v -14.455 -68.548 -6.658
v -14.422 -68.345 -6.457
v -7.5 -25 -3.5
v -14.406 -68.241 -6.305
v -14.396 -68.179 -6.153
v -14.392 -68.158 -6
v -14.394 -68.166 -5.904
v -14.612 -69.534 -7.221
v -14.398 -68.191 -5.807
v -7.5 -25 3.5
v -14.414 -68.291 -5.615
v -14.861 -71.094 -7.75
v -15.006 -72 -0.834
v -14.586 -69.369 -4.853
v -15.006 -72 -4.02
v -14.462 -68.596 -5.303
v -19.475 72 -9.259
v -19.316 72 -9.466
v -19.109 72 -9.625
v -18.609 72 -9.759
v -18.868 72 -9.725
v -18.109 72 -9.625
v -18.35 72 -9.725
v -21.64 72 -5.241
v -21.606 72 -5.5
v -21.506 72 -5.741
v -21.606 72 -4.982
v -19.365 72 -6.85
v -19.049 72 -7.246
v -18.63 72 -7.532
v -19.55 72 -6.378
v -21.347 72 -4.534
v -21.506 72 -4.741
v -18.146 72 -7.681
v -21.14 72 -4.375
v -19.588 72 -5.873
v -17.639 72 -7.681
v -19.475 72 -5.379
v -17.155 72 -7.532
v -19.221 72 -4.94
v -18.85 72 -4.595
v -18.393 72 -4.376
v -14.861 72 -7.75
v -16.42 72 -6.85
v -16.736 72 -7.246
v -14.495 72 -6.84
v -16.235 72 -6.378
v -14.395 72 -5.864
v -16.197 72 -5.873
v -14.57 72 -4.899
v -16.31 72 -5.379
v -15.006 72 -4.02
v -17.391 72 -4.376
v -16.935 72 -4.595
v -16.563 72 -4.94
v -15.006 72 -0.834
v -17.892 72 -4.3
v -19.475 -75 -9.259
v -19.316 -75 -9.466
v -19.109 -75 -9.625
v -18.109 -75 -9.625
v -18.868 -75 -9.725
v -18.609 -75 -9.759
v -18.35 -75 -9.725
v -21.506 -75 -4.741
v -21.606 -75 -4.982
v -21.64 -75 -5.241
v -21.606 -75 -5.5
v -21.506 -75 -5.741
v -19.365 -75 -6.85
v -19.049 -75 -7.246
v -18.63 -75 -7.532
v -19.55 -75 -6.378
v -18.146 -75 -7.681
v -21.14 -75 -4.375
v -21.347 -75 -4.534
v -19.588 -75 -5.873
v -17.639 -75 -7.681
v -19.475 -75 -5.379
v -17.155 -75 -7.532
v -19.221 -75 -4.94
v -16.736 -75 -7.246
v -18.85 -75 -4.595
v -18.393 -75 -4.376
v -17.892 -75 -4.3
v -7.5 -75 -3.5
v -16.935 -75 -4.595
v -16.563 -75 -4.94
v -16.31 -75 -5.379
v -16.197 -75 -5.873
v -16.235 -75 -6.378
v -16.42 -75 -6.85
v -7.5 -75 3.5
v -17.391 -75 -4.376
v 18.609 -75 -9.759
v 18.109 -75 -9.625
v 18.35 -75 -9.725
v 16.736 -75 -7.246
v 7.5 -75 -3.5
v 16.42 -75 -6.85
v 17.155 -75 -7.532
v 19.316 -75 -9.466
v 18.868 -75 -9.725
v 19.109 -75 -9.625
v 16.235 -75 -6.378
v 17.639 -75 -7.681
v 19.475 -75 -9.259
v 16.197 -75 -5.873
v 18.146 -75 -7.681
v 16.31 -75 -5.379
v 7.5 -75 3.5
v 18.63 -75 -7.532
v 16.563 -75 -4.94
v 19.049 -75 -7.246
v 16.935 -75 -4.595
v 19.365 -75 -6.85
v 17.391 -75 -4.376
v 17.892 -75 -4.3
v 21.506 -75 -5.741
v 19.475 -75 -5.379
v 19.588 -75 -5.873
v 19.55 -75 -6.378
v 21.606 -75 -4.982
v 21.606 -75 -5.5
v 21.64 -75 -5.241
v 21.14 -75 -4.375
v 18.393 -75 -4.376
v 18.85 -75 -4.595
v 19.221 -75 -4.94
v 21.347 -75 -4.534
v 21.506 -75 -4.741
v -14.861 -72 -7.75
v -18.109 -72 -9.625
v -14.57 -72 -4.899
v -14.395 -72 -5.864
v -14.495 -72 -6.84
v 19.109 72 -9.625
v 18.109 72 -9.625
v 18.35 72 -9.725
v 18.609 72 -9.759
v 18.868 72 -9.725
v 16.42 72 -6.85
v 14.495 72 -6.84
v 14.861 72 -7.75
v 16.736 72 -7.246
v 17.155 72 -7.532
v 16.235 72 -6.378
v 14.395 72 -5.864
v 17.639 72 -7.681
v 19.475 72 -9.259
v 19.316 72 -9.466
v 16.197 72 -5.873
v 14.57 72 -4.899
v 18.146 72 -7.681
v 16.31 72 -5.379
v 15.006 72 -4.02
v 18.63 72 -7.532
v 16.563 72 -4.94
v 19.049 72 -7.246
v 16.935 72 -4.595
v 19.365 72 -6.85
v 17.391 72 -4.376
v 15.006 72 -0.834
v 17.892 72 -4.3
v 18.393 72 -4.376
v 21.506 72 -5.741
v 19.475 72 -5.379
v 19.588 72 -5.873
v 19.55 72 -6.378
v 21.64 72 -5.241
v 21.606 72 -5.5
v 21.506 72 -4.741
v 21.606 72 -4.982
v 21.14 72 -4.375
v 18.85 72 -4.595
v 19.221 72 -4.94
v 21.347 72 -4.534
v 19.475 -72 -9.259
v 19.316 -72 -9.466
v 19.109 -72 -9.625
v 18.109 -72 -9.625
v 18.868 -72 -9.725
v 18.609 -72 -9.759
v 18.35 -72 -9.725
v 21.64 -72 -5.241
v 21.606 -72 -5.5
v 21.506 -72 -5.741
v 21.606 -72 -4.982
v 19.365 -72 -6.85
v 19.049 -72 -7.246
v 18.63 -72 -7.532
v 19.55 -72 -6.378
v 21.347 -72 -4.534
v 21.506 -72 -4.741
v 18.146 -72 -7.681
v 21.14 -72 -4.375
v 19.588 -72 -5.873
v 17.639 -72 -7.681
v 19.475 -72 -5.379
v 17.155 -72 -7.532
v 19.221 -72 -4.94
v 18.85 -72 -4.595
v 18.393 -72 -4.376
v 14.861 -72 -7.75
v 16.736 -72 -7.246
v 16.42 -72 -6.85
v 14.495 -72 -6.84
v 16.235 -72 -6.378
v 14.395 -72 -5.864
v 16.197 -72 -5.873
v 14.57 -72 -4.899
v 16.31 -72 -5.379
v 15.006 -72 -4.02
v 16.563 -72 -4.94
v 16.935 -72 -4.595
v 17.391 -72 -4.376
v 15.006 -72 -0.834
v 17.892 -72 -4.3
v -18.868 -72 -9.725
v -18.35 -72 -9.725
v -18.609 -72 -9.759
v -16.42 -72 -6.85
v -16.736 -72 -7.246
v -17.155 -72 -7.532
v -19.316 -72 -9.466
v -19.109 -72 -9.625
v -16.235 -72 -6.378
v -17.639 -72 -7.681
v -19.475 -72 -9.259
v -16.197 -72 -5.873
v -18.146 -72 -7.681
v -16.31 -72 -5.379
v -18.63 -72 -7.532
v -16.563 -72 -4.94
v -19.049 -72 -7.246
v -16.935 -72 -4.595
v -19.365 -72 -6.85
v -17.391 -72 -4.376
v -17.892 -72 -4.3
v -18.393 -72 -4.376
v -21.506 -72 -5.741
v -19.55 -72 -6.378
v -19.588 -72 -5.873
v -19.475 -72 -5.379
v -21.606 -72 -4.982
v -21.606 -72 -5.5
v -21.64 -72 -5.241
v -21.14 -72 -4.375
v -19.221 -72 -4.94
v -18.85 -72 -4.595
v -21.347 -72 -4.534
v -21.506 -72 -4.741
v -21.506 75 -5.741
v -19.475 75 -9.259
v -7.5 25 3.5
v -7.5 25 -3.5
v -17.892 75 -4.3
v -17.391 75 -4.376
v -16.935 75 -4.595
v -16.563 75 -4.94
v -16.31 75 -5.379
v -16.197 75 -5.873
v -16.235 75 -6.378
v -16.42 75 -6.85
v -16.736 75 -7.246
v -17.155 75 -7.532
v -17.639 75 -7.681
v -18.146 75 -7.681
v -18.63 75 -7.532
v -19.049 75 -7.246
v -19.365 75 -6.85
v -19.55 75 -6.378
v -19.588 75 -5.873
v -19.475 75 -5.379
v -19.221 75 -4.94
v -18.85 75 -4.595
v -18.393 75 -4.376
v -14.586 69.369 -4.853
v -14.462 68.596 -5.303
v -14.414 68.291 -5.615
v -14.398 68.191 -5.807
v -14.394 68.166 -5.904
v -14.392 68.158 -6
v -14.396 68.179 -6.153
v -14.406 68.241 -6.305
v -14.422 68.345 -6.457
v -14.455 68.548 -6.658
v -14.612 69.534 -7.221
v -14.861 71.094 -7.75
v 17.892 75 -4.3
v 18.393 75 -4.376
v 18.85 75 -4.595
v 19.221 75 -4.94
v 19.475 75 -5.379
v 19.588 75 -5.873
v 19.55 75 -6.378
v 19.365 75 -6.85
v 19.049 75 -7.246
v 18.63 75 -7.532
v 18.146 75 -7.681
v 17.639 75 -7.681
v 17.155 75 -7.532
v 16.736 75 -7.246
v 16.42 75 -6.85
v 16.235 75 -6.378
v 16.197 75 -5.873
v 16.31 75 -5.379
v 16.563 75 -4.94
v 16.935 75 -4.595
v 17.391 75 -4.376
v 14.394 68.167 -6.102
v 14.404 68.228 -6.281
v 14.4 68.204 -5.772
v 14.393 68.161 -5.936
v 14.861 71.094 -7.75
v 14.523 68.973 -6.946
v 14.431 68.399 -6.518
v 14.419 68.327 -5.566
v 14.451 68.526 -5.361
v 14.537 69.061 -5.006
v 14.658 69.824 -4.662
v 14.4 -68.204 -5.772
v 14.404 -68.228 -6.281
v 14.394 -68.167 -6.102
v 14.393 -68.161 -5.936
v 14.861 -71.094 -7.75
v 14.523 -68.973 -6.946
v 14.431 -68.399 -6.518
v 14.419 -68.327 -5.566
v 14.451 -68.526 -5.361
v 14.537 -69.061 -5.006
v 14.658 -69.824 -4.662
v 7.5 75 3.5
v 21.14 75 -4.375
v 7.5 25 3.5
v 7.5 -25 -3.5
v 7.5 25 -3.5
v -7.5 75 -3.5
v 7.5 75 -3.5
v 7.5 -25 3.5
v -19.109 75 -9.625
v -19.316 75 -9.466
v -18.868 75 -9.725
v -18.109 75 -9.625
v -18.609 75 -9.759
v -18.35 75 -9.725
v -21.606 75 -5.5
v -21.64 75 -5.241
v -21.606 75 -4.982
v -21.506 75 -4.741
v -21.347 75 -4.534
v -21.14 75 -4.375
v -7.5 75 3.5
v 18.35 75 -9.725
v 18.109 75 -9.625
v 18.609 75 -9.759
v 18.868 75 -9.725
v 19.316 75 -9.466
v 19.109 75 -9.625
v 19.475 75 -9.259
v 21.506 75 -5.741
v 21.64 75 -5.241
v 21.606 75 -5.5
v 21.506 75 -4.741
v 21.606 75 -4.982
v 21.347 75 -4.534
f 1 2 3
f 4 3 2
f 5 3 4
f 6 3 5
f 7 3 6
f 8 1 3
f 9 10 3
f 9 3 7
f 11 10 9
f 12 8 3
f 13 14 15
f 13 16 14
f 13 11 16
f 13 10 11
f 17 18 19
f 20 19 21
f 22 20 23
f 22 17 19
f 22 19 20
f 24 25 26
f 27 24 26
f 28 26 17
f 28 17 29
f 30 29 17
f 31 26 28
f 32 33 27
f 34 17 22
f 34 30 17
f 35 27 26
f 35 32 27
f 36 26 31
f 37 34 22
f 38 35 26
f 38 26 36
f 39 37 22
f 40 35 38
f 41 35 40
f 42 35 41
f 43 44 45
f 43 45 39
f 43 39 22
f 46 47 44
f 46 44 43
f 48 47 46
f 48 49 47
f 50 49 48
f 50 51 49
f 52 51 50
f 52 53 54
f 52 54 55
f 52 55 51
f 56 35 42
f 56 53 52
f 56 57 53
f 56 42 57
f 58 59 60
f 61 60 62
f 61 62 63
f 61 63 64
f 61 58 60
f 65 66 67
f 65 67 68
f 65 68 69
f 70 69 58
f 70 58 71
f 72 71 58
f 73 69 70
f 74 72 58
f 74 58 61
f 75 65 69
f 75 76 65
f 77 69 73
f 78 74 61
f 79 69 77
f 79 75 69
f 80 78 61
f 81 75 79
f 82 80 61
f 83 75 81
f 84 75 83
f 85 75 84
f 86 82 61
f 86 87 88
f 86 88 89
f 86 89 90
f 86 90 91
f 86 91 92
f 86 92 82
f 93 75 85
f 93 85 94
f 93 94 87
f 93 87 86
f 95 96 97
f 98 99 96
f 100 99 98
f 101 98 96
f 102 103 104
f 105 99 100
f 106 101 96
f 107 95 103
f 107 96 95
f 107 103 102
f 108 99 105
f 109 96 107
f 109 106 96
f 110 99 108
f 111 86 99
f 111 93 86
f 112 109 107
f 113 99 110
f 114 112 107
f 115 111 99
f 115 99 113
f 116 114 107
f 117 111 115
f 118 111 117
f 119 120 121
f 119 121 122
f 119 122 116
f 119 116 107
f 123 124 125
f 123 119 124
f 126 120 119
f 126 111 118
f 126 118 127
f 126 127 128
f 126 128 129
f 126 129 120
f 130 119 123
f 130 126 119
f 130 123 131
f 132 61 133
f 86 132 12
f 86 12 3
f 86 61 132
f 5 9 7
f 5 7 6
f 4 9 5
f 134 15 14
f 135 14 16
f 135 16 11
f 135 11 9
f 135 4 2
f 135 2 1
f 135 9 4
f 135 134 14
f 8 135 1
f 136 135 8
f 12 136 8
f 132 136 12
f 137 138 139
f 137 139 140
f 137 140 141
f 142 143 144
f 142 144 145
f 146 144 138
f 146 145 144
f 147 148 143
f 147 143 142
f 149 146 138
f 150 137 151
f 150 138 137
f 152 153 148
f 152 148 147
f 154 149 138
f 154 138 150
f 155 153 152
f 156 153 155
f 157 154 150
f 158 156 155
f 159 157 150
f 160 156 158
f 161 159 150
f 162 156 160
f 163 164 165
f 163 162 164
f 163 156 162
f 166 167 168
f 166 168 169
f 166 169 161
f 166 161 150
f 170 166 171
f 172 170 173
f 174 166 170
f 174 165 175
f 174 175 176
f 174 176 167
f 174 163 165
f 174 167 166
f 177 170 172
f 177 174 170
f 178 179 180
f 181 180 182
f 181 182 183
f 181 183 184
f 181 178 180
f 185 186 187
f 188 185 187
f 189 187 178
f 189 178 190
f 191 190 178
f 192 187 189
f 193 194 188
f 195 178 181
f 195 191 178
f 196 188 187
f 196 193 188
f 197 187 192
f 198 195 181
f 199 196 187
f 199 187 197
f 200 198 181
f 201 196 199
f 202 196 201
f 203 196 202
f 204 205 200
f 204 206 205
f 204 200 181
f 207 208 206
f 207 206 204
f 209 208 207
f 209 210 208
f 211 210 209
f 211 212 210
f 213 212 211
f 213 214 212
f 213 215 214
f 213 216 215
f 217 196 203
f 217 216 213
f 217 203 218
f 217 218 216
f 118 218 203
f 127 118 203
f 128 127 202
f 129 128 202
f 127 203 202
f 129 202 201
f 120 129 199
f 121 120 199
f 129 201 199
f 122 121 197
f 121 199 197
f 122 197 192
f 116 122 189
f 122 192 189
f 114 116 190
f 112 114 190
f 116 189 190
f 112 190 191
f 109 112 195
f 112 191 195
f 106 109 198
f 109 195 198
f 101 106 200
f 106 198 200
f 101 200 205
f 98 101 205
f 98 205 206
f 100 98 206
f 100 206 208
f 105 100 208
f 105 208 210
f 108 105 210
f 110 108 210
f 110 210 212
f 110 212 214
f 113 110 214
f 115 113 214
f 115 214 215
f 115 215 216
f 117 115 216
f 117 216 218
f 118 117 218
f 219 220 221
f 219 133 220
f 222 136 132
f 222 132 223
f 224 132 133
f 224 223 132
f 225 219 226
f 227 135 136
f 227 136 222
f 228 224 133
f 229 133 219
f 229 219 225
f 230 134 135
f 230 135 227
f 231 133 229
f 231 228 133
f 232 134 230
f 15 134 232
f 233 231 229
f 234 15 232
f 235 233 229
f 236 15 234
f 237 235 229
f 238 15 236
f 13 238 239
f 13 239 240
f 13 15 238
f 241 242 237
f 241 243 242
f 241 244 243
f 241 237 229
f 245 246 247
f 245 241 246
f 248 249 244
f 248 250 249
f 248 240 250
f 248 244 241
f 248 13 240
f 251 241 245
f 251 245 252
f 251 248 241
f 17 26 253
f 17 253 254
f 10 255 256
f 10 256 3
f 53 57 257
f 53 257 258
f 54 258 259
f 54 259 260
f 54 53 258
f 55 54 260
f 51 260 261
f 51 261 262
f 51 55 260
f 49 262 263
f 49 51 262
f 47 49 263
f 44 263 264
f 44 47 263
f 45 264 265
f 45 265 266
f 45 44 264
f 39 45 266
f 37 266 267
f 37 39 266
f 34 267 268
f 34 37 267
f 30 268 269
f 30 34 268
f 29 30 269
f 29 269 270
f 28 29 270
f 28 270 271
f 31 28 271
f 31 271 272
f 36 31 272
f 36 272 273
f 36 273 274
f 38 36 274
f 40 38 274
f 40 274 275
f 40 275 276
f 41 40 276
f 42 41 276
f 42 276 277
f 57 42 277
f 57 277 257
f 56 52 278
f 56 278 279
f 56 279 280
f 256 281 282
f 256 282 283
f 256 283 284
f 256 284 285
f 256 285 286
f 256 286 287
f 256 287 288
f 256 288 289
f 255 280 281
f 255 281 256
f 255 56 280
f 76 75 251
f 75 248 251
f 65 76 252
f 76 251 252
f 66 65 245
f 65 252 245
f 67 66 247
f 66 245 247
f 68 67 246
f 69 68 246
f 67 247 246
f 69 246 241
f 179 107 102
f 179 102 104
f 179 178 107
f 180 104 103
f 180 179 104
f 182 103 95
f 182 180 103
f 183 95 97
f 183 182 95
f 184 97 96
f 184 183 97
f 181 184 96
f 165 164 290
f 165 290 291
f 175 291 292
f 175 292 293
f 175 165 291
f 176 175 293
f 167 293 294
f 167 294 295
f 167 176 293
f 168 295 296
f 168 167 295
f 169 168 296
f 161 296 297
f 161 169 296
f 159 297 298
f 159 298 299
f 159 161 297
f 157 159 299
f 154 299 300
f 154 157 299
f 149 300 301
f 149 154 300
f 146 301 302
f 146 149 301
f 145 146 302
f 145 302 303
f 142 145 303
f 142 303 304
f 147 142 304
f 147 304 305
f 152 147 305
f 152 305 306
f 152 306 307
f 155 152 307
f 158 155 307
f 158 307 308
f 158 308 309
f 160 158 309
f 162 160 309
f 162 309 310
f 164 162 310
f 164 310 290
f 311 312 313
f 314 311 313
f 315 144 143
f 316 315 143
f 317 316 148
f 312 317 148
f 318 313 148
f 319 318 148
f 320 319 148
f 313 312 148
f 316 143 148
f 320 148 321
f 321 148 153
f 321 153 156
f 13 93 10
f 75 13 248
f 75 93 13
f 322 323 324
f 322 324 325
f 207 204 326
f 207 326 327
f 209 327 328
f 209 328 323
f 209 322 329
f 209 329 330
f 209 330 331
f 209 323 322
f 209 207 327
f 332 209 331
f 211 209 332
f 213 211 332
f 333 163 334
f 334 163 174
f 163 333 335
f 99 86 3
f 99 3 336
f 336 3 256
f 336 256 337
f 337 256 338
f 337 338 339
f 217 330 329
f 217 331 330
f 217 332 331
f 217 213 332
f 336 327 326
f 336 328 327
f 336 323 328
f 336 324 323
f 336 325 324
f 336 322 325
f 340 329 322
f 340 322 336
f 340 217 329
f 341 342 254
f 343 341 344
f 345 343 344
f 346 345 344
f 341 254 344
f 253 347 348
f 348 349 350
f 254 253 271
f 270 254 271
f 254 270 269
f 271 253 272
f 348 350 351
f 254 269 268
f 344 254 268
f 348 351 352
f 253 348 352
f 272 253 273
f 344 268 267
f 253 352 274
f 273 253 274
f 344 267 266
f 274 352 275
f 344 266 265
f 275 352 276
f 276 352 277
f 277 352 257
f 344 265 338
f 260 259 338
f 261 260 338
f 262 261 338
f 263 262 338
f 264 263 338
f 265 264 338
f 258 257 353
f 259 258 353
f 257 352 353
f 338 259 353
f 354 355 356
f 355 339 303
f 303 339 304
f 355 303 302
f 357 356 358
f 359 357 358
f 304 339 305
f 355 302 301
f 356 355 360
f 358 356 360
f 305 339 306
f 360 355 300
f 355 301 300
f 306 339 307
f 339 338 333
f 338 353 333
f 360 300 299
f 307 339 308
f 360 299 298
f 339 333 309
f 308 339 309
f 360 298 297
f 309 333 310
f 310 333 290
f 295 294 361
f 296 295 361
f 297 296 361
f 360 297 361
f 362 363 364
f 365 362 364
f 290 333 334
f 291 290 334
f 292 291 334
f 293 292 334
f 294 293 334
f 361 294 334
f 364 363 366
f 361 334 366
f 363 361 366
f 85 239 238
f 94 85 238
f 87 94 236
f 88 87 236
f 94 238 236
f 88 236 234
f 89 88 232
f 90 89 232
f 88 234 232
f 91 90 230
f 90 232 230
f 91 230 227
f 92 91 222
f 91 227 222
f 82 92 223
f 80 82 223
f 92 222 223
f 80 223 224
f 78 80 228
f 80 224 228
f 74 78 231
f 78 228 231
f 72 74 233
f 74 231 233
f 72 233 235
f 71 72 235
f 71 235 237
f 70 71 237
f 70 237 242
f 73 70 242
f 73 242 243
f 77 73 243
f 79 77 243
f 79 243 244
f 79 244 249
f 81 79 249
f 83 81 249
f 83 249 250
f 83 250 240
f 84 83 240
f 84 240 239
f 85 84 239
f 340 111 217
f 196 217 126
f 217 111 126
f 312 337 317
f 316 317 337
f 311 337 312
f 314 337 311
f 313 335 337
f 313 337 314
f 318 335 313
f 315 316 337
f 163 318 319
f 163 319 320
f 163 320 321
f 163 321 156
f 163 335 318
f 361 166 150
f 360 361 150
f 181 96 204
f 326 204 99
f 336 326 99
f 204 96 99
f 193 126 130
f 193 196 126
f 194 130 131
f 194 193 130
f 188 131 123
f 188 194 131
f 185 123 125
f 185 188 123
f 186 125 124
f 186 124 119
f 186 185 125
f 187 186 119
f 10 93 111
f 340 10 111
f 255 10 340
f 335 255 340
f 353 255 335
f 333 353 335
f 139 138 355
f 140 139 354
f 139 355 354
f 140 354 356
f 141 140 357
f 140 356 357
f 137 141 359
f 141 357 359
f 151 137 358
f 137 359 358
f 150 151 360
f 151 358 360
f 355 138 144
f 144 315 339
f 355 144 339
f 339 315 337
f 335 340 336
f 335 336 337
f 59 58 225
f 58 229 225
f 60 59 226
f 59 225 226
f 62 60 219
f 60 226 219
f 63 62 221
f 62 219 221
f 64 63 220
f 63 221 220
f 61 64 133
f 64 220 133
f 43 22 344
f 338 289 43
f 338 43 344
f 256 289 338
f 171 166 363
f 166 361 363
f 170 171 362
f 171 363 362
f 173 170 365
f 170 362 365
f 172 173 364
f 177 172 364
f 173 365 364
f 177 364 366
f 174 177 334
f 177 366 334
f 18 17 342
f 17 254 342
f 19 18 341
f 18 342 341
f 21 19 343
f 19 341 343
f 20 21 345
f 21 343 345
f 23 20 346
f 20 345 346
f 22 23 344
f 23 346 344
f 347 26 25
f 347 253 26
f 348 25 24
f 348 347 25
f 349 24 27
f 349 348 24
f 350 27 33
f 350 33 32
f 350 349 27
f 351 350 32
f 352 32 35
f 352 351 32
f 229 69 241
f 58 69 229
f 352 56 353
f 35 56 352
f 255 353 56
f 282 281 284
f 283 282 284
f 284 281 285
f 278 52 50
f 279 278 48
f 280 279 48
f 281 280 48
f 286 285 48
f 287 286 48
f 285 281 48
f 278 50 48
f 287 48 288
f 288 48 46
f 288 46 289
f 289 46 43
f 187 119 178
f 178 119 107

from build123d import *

# Parameters (mm, degrees)
SKETCH2_W            = 15
SKETCH2_H            = 150
BOSS_EXTRUDE1_DEPTH  = 3.5
BOSS_EXTRUDE2_DEPTH  = 150
CUT_EXTRUDE1_DEPTH   = 80.340414561
CUT_EXTRUDE2_REACH   = 150.982
SKETCH6_R            = 1.7
FILLET2_R            = 1
CUT_EXTRUDE3_REACH   = 150.982
SKETCH7_R            = 3.5
FILLET2_OF_MIRROR1_R = 1


with BuildPart() as part:
    # Sketch2 → Boss-Extrude1 (new, symmetric)
    with BuildSketch(Plane.XY):
        Rectangle(SKETCH2_W, SKETCH2_H)
    extrude(amount=BOSS_EXTRUDE1_DEPTH, both=True)

    # Sketch3 → Boss-Extrude2 (add)
    with BuildSketch(Plane.XZ.offset(75)):
        Polygon((-7.5, 3.5), (-22.005925513, -4.875), (-18.9748366, -10.125), (-7.5, -3.5), align=None)
        Polygon((7.5, 3.5), (22.005925513, -4.875), (18.9748366, -10.125), (7.5, -3.5), align=None)
    extrude(amount=-BOSS_EXTRUDE2_DEPTH)

    # Sketch5 → Cut-Extrude1 (cut, through all)
    with BuildSketch(Plane.XY.offset(3.5)):
        Polygon((-7.5, 25), (-7.5, -25), (-15.005925513, -72), (-22.005925513, -72), (-22.005925513, 72), (-15.005925513, 72), align=None)
        Polygon((22.005925513, -72), (15.005925513, -72), (7.5, -25), (7.5, 25), (15.005925513, 72), (22.005925513, 72), align=None)
    extrude(amount=-CUT_EXTRUDE1_DEPTH, mode=Mode.SUBTRACT)

    # Sketch6 → Cut-Extrude2 (cut, up to next)
    with BuildSketch(Plane(origin=(0, -72, 0), x_dir=(1, 0, 0), z_dir=(0, 1, 0)), mode=Mode.PRIVATE) as cut_extrude2_sk1:
        with Locations(Location((17.892304845, 6, 0), (0, 0, 270))):
            Circle(SKETCH6_R)
    cut_extrude2_tool1 = extrude(cut_extrude2_sk1.sketch, amount=-CUT_EXTRUDE2_REACH, mode=Mode.PRIVATE) & part.part
    # Sketch6 → Cut-Extrude2 (cut, up to next)
    with BuildSketch(Plane(origin=(0, -72, 0), x_dir=(1, 0, 0), z_dir=(0, 1, 0)), mode=Mode.PRIVATE) as cut_extrude2_sk2:
        with Locations(Location((-17.892304845, 6, 0), (0, 0, 270))):
            Circle(SKETCH6_R)
    cut_extrude2_tool2 = extrude(cut_extrude2_sk2.sketch, amount=-CUT_EXTRUDE2_REACH, mode=Mode.PRIVATE) & part.part
    cut_extrude2_1 = cut_extrude2_tool1.solids().sort_by_distance((17.892305, -72, -6))[0]
    add(cut_extrude2_1, mode=Mode.SUBTRACT)
    cut_extrude2_2 = cut_extrude2_tool2.solids().sort_by_distance((-17.892305, -72, -6))[0]
    add(cut_extrude2_2, mode=Mode.SUBTRACT)
    cut_extrude2 = cut_extrude2_1 + cut_extrude2_2  # Cut-Extrude2 as one shape, for the pattern or mirror that repeats it

    # Fillet2
    fillet2_edges = [part.edges().sort_by_distance(p)[0] for p in [
        (18.9748366, -73.5, -10.125),
        (22.005925513, -73.5, -4.875),
        (-22.005925513, -73.5, -4.875),
        (-18.9748366, -73.5, -10.125),
    ]]
    fillet(fillet2_edges, radius=FILLET2_R)

    # Sketch7 → Cut-Extrude3 (cut, up to next)
    with BuildSketch(Plane(origin=(0, -72, 0), x_dir=(1, 0, 0), z_dir=(0, 1, 0)), mode=Mode.PRIVATE) as cut_extrude3_sk1:
        with Locations((-17.892304845, 6)):
            Circle(SKETCH7_R)
    cut_extrude3_tool1 = extrude(cut_extrude3_sk1.sketch, amount=CUT_EXTRUDE3_REACH, mode=Mode.PRIVATE) & part.part
    # Sketch7 → Cut-Extrude3 (cut, up to next)
    with BuildSketch(Plane(origin=(0, -72, 0), x_dir=(1, 0, 0), z_dir=(0, 1, 0)), mode=Mode.PRIVATE) as cut_extrude3_sk2:
        with Locations((17.892304845, 6)):
            Circle(SKETCH7_R)
    cut_extrude3_tool2 = extrude(cut_extrude3_sk2.sketch, amount=CUT_EXTRUDE3_REACH, mode=Mode.PRIVATE) & part.part
    cut_extrude3_1 = cut_extrude3_tool1.solids().sort_by_distance((-17.892305, -72, -6))[0]
    add(cut_extrude3_1, mode=Mode.SUBTRACT)
    cut_extrude3_2 = cut_extrude3_tool2.solids().sort_by_distance((17.892305, -72, -6))[0]
    add(cut_extrude3_2, mode=Mode.SUBTRACT)
    cut_extrude3 = cut_extrude3_1 + cut_extrude3_2  # Cut-Extrude3 as one shape, for the pattern or mirror that repeats it

    # Mirror1: Cut-Extrude2, Cut-Extrude3 across plane
    add(cut_extrude2.mirror(Plane.ZX), mode=Mode.SUBTRACT)
    add(cut_extrude3.mirror(Plane.ZX), mode=Mode.SUBTRACT)

    # Fillet2 of Mirror1
    fillet2_of_mirror1_edges = [part.edges().sort_by_distance(p)[0] for p in [
        (18.9748366, 73.5, -10.125),
        (22.005925513, 73.5, -4.875),
        (-22.005925513, 73.5, -4.875),
        (-18.9748366, 73.5, -10.125),
    ]]
    fillet(fillet2_of_mirror1_edges, radius=FILLET2_OF_MIRROR1_R)


solid = part.part
